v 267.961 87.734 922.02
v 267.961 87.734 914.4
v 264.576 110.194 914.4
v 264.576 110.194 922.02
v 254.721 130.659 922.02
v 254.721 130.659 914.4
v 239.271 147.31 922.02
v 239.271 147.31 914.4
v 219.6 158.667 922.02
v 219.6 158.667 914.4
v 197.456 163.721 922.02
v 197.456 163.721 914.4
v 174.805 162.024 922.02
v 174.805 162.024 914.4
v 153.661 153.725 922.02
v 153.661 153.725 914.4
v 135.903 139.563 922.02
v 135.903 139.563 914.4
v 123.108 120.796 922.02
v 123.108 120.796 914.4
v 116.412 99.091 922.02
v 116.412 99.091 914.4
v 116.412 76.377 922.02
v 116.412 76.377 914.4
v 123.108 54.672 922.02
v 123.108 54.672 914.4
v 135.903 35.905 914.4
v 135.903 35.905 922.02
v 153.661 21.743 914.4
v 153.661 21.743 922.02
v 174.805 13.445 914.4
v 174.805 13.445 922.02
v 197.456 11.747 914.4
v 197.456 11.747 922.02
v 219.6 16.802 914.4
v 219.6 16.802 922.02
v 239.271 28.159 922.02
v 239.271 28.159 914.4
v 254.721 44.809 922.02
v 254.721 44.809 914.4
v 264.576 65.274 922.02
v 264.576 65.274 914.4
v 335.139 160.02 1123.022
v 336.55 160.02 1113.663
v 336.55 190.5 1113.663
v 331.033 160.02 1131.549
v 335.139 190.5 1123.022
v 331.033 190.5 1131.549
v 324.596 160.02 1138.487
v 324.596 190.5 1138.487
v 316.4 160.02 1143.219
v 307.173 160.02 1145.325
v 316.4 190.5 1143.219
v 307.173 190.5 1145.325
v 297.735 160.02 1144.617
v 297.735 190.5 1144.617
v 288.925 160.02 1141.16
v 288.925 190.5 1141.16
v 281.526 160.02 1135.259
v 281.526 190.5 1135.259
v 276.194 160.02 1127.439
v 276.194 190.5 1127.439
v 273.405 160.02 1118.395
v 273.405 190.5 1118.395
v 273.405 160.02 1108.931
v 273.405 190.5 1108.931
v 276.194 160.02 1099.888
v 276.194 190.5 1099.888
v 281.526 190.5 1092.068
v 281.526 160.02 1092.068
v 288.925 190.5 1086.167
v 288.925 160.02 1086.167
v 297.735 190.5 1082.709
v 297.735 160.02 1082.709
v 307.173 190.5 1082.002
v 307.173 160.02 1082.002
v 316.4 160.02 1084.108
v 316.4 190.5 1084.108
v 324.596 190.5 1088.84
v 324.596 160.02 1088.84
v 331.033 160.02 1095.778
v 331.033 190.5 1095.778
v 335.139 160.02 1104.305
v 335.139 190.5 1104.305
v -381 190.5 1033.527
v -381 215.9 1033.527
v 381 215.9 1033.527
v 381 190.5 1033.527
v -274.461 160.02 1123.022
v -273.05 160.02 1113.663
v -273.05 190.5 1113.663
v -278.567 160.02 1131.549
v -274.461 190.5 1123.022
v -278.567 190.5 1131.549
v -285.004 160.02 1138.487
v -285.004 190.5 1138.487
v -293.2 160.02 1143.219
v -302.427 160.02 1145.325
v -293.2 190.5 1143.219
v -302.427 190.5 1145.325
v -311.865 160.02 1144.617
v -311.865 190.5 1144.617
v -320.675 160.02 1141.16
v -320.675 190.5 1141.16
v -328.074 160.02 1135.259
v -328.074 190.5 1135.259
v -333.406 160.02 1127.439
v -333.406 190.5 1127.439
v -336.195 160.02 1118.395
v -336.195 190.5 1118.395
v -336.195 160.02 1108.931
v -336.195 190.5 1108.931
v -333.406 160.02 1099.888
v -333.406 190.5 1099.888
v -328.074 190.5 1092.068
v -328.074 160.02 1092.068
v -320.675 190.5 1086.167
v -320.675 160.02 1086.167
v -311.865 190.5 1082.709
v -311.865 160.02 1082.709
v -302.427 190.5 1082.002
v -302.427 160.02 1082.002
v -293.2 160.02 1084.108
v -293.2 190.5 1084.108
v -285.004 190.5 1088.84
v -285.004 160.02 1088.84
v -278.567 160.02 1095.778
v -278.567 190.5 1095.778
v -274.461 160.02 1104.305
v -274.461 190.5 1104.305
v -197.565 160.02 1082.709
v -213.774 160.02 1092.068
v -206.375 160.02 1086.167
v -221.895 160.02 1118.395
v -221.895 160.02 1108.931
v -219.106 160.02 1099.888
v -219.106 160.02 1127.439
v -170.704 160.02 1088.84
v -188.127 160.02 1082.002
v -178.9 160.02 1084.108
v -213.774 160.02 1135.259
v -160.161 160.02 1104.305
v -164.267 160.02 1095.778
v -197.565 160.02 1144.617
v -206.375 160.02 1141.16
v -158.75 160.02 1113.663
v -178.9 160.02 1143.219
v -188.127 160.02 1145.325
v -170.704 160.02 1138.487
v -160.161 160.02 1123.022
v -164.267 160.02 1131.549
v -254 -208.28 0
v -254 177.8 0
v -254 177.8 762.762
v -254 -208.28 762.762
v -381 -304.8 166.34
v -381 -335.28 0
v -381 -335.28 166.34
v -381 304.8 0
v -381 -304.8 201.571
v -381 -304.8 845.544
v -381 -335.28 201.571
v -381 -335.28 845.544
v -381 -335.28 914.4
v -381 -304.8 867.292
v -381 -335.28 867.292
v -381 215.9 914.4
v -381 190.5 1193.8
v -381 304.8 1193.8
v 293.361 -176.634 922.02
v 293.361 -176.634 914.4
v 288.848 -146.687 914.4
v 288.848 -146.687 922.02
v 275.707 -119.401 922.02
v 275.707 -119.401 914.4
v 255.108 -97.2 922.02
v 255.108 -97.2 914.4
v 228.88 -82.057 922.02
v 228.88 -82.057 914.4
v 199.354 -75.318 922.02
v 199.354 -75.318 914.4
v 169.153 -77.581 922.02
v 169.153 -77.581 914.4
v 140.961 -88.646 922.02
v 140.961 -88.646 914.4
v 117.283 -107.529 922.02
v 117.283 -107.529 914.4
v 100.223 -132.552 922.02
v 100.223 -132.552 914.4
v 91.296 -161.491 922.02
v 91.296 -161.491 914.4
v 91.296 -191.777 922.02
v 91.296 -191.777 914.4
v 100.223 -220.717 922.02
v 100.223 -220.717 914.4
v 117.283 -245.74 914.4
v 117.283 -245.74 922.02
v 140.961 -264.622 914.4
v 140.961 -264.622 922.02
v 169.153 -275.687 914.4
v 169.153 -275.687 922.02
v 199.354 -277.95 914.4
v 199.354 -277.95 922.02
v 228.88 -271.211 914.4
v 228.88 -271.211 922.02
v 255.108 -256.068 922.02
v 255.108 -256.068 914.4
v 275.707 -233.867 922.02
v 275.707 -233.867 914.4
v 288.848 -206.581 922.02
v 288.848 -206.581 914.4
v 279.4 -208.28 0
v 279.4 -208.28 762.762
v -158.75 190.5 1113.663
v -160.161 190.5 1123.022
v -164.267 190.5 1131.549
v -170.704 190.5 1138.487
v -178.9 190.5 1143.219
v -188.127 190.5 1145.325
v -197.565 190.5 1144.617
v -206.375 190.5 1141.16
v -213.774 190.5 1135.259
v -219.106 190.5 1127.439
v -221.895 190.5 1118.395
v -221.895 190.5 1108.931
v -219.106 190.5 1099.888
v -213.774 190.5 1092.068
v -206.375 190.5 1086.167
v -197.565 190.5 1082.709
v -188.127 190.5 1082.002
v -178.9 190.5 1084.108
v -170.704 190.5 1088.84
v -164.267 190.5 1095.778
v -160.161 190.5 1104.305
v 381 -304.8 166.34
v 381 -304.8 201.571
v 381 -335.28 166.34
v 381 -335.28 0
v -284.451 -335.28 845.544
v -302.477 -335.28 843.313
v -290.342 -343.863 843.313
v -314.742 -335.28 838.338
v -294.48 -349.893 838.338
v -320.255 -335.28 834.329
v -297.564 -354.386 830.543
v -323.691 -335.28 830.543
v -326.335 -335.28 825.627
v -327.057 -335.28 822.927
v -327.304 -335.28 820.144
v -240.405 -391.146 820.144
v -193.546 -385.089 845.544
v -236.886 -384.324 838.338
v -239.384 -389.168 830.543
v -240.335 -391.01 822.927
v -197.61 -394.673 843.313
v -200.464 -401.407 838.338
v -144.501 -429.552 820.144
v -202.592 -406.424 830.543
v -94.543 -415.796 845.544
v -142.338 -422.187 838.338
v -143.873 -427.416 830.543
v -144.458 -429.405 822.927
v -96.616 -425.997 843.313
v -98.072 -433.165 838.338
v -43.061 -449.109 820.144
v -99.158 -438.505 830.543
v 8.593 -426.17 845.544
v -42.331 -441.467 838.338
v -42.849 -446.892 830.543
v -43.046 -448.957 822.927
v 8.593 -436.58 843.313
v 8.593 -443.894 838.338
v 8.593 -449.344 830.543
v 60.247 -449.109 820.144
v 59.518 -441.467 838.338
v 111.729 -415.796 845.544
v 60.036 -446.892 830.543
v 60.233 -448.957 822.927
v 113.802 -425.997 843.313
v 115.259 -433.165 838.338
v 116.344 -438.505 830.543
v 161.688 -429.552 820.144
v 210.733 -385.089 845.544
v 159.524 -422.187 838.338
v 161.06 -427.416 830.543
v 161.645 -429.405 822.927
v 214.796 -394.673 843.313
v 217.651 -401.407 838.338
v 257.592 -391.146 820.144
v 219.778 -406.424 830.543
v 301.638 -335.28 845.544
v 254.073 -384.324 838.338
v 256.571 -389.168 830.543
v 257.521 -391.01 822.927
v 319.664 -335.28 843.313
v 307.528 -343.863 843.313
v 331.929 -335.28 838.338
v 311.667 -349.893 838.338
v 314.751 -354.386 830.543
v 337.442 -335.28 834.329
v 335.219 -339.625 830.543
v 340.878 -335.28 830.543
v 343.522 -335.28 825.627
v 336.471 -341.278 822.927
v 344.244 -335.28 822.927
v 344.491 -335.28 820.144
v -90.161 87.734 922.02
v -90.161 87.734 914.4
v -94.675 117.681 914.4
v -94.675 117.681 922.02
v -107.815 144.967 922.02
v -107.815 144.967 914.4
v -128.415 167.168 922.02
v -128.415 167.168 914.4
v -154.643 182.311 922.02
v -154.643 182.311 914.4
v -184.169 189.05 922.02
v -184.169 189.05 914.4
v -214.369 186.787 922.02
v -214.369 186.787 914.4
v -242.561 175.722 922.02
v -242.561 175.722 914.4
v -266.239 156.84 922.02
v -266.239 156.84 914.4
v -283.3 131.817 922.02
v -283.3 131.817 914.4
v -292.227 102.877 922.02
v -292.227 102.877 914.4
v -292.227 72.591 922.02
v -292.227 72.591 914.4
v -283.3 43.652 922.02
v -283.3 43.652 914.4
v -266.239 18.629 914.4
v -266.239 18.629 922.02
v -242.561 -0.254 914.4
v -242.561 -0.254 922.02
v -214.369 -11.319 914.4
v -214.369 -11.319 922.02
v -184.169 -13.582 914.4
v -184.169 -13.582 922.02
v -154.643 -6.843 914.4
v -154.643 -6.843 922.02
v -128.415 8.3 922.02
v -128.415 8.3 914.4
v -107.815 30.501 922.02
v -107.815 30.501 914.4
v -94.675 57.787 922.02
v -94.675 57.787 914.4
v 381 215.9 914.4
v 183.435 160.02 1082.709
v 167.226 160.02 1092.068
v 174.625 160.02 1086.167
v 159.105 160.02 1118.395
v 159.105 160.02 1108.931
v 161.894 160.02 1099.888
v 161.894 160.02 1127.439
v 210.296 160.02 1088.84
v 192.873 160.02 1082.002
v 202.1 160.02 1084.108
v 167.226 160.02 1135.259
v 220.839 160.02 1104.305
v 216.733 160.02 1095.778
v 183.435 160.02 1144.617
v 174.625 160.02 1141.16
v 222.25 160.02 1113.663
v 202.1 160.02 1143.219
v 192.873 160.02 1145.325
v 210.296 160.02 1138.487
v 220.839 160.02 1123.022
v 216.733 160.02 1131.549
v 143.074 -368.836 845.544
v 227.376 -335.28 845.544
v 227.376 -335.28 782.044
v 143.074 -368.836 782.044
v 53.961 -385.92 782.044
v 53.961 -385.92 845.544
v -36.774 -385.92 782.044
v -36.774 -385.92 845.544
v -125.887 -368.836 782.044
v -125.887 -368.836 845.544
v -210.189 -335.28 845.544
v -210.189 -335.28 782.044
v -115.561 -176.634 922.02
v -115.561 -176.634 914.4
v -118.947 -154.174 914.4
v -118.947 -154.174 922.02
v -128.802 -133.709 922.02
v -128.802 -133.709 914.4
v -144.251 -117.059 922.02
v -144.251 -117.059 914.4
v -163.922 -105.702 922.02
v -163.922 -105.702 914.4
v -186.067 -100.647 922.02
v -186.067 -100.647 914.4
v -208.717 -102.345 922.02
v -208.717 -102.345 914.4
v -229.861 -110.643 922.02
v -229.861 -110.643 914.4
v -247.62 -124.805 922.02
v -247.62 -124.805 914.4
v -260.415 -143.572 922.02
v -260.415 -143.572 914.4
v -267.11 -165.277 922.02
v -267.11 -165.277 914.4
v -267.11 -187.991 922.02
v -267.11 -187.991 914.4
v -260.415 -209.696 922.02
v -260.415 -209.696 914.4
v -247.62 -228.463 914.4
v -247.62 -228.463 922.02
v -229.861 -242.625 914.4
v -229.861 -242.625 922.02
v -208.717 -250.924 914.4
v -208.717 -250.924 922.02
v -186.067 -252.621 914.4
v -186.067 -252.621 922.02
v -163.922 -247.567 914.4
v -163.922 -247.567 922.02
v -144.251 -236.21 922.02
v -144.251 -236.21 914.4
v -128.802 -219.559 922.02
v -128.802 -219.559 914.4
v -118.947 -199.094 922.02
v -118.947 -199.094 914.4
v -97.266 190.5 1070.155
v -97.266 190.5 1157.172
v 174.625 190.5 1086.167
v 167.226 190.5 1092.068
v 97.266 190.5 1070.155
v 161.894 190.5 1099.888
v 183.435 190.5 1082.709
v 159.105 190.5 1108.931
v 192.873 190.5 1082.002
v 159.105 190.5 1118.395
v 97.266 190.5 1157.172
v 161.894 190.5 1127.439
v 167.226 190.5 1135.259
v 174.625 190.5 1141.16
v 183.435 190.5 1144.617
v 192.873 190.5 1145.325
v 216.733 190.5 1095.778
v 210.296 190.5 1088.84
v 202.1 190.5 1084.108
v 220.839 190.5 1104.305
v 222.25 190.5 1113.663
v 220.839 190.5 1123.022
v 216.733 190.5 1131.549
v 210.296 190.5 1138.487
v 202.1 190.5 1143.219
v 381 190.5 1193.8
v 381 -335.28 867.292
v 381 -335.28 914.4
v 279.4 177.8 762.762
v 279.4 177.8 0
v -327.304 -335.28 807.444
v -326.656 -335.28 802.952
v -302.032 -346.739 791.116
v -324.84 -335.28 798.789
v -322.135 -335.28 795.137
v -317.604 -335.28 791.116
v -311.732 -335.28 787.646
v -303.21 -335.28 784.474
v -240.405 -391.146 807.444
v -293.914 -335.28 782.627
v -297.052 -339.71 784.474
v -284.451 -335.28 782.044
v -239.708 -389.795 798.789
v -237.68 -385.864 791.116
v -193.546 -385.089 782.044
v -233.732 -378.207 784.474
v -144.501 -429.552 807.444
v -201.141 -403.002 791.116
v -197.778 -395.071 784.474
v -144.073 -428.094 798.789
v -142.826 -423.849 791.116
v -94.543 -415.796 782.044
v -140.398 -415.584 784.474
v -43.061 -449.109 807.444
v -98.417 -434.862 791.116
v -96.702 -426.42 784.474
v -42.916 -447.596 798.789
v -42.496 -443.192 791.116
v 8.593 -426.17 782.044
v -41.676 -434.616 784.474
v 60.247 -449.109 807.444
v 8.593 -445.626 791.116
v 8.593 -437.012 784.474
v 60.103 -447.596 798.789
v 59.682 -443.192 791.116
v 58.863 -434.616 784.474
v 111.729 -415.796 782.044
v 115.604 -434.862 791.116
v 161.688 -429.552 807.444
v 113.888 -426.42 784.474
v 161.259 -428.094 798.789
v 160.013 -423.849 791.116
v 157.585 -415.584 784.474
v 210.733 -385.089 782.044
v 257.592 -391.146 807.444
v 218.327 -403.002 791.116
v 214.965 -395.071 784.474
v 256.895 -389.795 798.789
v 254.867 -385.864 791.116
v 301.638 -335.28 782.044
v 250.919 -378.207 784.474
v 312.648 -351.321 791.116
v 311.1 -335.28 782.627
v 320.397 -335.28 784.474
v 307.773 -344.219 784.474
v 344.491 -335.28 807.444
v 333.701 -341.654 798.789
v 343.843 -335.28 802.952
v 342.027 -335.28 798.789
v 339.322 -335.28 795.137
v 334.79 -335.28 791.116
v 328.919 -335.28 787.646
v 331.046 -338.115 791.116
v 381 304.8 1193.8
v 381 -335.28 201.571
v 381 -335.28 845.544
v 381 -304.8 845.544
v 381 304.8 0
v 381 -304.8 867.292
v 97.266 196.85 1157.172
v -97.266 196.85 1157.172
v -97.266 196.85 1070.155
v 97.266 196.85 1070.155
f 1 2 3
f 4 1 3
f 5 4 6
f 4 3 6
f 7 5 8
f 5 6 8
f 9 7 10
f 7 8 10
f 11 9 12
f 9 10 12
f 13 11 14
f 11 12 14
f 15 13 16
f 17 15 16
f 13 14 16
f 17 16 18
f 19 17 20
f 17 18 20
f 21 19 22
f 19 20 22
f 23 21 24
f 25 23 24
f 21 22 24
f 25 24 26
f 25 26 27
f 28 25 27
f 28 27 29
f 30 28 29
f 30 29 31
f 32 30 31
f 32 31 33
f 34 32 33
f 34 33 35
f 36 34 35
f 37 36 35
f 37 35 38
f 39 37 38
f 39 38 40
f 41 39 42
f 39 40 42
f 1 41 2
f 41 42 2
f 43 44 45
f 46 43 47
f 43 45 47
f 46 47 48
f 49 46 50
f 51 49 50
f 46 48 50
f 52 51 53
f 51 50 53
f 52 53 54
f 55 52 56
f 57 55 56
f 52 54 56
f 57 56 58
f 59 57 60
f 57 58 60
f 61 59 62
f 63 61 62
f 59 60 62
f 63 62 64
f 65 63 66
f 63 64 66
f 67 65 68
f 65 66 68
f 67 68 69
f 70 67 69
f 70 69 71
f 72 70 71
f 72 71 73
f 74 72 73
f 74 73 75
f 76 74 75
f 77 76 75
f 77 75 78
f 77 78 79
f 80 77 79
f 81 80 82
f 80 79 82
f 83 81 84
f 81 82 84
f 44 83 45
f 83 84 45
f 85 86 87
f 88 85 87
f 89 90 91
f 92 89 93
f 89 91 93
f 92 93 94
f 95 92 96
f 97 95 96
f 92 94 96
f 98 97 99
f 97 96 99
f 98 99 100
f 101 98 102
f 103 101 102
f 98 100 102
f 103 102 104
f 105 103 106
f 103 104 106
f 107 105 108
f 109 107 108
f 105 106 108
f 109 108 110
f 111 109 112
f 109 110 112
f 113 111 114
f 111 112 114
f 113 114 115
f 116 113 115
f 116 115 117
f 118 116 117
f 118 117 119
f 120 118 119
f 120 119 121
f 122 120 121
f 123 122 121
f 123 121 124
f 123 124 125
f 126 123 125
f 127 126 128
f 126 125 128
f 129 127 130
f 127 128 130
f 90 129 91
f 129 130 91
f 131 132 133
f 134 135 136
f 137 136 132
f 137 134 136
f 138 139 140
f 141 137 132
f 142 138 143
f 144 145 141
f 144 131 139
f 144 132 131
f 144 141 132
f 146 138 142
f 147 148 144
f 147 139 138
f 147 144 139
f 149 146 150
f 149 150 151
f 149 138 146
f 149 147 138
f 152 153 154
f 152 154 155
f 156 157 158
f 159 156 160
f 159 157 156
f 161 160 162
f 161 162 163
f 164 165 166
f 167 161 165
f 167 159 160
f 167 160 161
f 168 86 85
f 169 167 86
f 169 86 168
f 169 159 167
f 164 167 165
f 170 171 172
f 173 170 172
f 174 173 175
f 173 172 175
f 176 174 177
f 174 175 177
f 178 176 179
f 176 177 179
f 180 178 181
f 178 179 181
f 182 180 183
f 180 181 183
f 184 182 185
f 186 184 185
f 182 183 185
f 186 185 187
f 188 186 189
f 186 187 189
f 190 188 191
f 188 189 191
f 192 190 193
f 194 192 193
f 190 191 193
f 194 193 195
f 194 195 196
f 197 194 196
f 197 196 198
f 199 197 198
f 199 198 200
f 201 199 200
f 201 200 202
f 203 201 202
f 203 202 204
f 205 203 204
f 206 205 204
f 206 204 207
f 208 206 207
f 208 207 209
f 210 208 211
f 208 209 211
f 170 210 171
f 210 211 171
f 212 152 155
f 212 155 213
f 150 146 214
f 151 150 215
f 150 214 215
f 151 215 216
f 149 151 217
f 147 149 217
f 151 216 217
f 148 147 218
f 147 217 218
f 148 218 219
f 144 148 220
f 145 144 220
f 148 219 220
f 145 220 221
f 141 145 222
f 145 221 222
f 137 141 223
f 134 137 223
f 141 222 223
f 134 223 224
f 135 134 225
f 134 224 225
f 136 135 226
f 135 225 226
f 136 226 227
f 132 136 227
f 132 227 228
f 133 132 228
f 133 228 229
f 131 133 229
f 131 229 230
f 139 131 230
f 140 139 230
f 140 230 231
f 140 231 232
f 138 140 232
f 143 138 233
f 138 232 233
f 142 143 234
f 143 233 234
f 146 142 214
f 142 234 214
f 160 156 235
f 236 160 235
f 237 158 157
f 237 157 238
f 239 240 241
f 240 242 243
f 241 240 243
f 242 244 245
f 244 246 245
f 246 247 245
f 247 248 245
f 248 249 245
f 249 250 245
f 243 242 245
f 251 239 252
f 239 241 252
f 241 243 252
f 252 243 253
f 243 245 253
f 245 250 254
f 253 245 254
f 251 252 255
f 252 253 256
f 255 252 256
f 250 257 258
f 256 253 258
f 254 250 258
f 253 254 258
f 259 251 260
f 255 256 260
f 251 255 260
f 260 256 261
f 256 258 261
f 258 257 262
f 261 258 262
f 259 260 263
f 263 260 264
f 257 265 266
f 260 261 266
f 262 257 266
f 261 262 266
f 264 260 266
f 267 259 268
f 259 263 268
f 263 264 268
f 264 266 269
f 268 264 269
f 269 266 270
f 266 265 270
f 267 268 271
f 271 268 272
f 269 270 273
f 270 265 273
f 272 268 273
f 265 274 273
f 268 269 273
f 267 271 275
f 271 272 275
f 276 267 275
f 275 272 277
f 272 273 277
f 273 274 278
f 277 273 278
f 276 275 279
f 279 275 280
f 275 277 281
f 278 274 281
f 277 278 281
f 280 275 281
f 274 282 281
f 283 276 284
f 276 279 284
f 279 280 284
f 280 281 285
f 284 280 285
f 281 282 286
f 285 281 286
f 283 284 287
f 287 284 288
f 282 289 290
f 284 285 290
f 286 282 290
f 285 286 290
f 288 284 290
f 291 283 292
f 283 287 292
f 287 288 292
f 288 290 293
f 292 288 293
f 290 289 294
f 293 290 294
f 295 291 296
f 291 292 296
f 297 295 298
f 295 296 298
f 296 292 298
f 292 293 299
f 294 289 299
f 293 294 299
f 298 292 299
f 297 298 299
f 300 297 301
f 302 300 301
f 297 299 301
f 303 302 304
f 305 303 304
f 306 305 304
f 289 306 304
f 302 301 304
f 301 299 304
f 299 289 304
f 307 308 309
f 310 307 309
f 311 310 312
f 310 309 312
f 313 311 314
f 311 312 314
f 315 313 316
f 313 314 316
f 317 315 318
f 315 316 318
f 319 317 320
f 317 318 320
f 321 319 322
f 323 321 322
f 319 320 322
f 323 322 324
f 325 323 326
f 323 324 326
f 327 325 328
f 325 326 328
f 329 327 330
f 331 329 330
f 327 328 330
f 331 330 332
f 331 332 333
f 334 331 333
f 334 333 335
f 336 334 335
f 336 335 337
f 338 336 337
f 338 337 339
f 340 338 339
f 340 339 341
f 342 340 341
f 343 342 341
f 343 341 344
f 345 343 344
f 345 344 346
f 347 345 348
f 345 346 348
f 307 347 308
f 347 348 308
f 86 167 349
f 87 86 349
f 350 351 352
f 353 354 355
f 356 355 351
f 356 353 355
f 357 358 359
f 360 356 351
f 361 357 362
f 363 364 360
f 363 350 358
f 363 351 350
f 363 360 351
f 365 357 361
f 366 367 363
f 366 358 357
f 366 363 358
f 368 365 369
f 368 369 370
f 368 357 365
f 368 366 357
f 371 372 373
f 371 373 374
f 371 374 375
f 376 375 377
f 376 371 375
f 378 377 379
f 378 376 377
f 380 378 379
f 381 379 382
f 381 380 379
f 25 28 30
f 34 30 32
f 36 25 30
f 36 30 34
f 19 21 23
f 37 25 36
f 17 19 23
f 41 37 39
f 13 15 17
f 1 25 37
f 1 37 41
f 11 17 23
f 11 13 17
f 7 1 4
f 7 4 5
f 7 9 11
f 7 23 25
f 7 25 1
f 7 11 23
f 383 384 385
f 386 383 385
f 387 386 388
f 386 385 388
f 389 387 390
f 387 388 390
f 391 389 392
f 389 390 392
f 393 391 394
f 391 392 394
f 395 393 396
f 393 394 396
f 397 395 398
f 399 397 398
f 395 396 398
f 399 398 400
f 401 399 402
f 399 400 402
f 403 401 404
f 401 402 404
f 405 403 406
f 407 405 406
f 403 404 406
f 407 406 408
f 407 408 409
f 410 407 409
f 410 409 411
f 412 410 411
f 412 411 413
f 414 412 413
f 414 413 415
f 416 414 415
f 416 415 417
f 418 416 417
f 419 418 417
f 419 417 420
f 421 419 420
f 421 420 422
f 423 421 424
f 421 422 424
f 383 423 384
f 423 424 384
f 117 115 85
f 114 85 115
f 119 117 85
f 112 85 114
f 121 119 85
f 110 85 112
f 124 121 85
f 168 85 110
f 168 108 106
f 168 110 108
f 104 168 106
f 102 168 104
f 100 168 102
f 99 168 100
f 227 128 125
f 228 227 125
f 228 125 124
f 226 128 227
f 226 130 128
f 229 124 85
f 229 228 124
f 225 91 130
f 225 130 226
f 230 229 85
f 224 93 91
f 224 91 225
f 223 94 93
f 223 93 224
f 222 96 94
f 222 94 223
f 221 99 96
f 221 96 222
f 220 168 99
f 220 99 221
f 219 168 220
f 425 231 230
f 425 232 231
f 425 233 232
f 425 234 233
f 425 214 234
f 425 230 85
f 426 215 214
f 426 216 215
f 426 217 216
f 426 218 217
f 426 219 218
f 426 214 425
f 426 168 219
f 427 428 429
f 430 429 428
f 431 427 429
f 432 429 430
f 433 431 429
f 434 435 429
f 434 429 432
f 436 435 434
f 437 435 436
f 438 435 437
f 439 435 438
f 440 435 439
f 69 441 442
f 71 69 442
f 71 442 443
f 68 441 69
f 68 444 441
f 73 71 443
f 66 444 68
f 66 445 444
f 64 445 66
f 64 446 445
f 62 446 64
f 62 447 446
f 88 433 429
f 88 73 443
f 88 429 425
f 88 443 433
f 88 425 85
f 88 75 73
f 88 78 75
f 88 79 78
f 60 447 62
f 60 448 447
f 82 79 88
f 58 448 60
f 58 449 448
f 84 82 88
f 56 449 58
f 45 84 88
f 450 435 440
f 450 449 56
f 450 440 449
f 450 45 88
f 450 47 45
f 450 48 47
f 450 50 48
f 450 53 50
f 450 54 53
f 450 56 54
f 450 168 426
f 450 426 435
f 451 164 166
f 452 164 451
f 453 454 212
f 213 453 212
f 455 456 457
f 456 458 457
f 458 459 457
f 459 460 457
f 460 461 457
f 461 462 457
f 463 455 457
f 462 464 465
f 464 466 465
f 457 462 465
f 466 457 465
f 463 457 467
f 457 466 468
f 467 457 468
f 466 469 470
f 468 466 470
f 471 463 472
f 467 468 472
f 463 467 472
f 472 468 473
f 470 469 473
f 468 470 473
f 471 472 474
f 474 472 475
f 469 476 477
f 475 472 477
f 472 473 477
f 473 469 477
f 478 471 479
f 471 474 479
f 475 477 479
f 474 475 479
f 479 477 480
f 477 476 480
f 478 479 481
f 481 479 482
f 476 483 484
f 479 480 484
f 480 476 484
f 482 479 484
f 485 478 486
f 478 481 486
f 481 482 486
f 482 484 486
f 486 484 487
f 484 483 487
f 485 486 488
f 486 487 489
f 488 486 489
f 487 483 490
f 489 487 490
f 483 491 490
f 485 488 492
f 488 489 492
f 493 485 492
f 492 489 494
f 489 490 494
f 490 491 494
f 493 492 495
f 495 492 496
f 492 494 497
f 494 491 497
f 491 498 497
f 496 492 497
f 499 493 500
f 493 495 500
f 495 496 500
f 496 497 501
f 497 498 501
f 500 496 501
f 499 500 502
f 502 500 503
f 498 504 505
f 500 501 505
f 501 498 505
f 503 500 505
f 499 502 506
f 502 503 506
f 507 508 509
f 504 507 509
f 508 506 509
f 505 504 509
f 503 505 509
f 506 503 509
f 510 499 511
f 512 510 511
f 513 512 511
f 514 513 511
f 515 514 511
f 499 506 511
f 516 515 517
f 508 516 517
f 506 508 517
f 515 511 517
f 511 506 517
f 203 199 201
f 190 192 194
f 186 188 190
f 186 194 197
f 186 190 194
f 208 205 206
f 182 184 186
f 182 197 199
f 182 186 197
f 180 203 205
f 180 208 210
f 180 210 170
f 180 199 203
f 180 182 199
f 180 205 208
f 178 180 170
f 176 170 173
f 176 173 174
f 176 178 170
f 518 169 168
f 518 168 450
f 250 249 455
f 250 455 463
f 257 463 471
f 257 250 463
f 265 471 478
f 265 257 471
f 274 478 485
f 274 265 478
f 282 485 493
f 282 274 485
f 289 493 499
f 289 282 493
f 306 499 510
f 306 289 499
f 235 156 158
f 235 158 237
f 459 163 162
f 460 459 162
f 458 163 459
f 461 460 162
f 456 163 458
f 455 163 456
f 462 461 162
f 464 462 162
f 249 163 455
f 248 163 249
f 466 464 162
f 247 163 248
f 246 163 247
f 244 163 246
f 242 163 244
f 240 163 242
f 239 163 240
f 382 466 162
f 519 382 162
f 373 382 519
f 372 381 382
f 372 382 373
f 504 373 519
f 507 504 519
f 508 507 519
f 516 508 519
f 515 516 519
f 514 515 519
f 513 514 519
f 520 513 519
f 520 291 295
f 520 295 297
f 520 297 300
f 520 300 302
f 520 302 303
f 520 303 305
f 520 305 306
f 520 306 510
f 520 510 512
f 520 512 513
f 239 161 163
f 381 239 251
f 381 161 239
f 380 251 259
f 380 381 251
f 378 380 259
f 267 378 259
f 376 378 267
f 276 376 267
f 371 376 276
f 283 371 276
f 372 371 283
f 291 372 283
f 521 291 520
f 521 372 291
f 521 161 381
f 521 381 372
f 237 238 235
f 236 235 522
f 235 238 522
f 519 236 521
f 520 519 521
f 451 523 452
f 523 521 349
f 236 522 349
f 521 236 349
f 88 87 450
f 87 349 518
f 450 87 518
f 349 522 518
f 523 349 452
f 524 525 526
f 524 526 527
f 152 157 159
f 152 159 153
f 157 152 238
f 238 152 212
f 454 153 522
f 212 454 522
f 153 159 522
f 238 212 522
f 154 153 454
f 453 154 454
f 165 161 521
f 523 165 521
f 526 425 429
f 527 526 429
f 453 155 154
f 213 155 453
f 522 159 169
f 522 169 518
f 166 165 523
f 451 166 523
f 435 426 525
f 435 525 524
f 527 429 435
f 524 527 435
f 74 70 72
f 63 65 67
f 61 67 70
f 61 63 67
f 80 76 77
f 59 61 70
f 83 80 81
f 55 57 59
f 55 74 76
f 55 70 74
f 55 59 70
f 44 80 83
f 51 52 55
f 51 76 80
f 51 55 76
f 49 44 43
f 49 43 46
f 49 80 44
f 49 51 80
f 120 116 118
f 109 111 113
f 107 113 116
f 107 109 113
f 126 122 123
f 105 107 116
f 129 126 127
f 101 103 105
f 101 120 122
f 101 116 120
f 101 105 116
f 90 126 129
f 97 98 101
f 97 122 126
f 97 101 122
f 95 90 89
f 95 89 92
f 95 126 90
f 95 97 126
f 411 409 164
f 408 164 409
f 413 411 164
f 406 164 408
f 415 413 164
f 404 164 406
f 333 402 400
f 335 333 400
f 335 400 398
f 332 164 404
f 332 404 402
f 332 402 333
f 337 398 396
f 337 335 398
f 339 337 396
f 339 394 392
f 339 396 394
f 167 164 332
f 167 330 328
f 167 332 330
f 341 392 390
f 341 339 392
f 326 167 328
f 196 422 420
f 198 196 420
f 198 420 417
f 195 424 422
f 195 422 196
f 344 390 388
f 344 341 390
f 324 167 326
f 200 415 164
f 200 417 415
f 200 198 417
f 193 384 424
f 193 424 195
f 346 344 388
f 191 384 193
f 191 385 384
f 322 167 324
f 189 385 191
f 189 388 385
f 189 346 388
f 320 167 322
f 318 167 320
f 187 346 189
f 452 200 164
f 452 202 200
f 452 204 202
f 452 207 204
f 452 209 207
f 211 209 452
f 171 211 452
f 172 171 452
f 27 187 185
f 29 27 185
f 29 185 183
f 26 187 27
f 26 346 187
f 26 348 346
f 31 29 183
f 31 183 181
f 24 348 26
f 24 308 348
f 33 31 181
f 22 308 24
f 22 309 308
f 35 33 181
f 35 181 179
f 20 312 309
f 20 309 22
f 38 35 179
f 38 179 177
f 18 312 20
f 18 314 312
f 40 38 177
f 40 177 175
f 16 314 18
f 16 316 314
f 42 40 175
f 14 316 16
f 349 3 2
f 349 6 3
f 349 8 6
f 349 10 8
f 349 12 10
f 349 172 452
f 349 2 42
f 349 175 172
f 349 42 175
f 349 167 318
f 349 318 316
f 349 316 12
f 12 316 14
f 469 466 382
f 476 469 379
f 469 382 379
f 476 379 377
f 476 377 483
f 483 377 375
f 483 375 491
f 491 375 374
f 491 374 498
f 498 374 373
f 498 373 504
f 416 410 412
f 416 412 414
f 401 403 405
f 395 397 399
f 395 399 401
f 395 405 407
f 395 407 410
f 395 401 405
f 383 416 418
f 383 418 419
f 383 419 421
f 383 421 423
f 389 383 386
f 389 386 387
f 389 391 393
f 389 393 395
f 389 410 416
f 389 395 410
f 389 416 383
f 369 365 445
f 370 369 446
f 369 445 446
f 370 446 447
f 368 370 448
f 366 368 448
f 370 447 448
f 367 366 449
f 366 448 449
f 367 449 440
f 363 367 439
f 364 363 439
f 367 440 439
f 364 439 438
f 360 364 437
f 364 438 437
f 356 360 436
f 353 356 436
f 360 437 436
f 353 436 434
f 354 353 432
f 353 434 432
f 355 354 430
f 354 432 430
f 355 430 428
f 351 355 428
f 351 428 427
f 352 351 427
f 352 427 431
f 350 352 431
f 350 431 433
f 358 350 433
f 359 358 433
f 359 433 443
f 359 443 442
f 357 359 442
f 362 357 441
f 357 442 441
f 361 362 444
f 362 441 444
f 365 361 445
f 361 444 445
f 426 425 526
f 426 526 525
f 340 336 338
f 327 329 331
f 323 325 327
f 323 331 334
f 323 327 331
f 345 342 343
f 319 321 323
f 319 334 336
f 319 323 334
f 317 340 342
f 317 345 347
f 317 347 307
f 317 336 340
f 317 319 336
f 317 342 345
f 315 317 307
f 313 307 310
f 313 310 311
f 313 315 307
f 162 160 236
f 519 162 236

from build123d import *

# Parameters (mm, degrees)
F0_W      = 762
F0_H      = 609.6
F1_DEPTH  = 914.4
F2_R      = 101.6
F2_R_2    = 76.2
F3_DEPTH  = 7.62
F2_W      = 762
F2_H      = 88.9
F4_DEPTH  = 279.4
F5_W      = 762
F5_H      = 47.1075362206
F5_H_2    = 643.9726948738
F5_H_3    = 166.3404107094
F6_DEPTH  = 30.48
F8_DEPTH  = 63.5
F9_R      = 25.4
F10_W     = 762
F10_H     = 160.2732217789
F11_DEPTH = 25.4
F12_R     = 31.75
F13_DEPTH = 30.48
F12_W     = 194.5324838161
F12_H     = 87.0171510696
F14_DEPTH = 6.35
F15_W     = 533.4
F15_H     = 386.08
F16_DEPTH = 762.762


with BuildPart() as f1:
    # F0 (on Top) → F1 (new body)
    with BuildSketch(Plane.XY):
        Rectangle(F0_W, F0_H)
    extrude(amount=F1_DEPTH)

    # F2 (on face) → F3 (join)
    with BuildSketch(Plane.XY.offset(914.4)):
        with Locations((-191.7613367384, 87.7341254172)):
            Circle(F2_R)
        with Locations((-191.7613367384, -176.6341254172)):
            Circle(F2_R_2)
        with Locations((191.7613367384, 87.7341254172)):
            Circle(F2_R_2)
        with Locations((191.7613367384, -176.6341254172)):
            Circle(F2_R)
    extrude(amount=F3_DEPTH)

    # F2 (on face) → F4 (join)
    with BuildSketch(Plane.XY.offset(914.4)):
        with Locations((0, 260.35)):
            Rectangle(F2_W, F2_H)
    extrude(amount=F4_DEPTH)

    # F5 (on face) → F6 (join)
    with BuildSketch(Plane.XZ.offset(304.8)):
        with Locations((0, 890.8462318897)):
            Rectangle(F5_W, F5_H)
        with Locations((0, 523.5575735569)):
            Rectangle(F5_W, F5_H_2)
        with Locations((0, 83.1702053547)):
            Rectangle(F5_W, F5_H_3)
    extrude(amount=F6_DEPTH)

    # F7 (on face) → F8 (join)
    with BuildSketch(Plane.XY.offset(845.5439209938)):
        with BuildLine():
            Line((-210.1894695859, -335.28), (-327.3042738438, -335.28))
            ThreePointArc((-327.3042738438, -335.28), (8.59336555, -451.5700550038), (344.4910049438, -335.28))
            Line((344.4910049438, -335.28), (227.376200686, -335.28))
            ThreePointArc((227.376200686, -335.28), (8.5933655501, -388.0700550038), (-210.1894695859, -335.28))
        make_face()
    extrude(amount=-F8_DEPTH)

    # F9
    f9_edges = [f1.edges().sort_by_distance(p)[0] for p in [
        (8.593366, -451.570055, 845.543921),
        (8.593366, -451.570055, 782.043921),
    ]]
    fillet(f9_edges, radius=F9_R)

    # F10 (on face) → F11 (join)
    with BuildSketch(Plane.XZ.offset(-215.9)):
        with Locations((0, 1113.6633891106)):
            Rectangle(F10_W, F10_H)
    extrude(amount=F11_DEPTH)

    # F12 (on face) → F13 (join)
    with BuildSketch(Plane.XZ.offset(-190.5)):
        with Locations((-304.8, 1113.6633891106)):
            Circle(F12_R)
        with Locations((-190.5, 1113.6633891106)):
            Circle(F12_R)
        with Locations((190.5, 1113.6633891106)):
            Circle(F12_R)
        with Locations((304.8, 1113.6633891106)):
            Circle(F12_R)
    extrude(amount=F13_DEPTH)

    # F12 (on face) → F14 (cut)
    with BuildSketch(Plane.XZ.offset(-190.5)):
        with Locations((0, 1113.6633891106)):
            Rectangle(F12_W, F12_H)
    extrude(amount=-F14_DEPTH, mode=Mode.SUBTRACT)

    # F15 (on face) → F16 (cut)
    with BuildSketch(Plane(origin=(0, 0, 0), x_dir=(1, 0, 0), z_dir=(0, 0, -1))):
        with Locations((12.7, 15.24)):
            Rectangle(F15_W, F15_H)
    extrude(amount=-F16_DEPTH, mode=Mode.SUBTRACT)


solid = f1.part
